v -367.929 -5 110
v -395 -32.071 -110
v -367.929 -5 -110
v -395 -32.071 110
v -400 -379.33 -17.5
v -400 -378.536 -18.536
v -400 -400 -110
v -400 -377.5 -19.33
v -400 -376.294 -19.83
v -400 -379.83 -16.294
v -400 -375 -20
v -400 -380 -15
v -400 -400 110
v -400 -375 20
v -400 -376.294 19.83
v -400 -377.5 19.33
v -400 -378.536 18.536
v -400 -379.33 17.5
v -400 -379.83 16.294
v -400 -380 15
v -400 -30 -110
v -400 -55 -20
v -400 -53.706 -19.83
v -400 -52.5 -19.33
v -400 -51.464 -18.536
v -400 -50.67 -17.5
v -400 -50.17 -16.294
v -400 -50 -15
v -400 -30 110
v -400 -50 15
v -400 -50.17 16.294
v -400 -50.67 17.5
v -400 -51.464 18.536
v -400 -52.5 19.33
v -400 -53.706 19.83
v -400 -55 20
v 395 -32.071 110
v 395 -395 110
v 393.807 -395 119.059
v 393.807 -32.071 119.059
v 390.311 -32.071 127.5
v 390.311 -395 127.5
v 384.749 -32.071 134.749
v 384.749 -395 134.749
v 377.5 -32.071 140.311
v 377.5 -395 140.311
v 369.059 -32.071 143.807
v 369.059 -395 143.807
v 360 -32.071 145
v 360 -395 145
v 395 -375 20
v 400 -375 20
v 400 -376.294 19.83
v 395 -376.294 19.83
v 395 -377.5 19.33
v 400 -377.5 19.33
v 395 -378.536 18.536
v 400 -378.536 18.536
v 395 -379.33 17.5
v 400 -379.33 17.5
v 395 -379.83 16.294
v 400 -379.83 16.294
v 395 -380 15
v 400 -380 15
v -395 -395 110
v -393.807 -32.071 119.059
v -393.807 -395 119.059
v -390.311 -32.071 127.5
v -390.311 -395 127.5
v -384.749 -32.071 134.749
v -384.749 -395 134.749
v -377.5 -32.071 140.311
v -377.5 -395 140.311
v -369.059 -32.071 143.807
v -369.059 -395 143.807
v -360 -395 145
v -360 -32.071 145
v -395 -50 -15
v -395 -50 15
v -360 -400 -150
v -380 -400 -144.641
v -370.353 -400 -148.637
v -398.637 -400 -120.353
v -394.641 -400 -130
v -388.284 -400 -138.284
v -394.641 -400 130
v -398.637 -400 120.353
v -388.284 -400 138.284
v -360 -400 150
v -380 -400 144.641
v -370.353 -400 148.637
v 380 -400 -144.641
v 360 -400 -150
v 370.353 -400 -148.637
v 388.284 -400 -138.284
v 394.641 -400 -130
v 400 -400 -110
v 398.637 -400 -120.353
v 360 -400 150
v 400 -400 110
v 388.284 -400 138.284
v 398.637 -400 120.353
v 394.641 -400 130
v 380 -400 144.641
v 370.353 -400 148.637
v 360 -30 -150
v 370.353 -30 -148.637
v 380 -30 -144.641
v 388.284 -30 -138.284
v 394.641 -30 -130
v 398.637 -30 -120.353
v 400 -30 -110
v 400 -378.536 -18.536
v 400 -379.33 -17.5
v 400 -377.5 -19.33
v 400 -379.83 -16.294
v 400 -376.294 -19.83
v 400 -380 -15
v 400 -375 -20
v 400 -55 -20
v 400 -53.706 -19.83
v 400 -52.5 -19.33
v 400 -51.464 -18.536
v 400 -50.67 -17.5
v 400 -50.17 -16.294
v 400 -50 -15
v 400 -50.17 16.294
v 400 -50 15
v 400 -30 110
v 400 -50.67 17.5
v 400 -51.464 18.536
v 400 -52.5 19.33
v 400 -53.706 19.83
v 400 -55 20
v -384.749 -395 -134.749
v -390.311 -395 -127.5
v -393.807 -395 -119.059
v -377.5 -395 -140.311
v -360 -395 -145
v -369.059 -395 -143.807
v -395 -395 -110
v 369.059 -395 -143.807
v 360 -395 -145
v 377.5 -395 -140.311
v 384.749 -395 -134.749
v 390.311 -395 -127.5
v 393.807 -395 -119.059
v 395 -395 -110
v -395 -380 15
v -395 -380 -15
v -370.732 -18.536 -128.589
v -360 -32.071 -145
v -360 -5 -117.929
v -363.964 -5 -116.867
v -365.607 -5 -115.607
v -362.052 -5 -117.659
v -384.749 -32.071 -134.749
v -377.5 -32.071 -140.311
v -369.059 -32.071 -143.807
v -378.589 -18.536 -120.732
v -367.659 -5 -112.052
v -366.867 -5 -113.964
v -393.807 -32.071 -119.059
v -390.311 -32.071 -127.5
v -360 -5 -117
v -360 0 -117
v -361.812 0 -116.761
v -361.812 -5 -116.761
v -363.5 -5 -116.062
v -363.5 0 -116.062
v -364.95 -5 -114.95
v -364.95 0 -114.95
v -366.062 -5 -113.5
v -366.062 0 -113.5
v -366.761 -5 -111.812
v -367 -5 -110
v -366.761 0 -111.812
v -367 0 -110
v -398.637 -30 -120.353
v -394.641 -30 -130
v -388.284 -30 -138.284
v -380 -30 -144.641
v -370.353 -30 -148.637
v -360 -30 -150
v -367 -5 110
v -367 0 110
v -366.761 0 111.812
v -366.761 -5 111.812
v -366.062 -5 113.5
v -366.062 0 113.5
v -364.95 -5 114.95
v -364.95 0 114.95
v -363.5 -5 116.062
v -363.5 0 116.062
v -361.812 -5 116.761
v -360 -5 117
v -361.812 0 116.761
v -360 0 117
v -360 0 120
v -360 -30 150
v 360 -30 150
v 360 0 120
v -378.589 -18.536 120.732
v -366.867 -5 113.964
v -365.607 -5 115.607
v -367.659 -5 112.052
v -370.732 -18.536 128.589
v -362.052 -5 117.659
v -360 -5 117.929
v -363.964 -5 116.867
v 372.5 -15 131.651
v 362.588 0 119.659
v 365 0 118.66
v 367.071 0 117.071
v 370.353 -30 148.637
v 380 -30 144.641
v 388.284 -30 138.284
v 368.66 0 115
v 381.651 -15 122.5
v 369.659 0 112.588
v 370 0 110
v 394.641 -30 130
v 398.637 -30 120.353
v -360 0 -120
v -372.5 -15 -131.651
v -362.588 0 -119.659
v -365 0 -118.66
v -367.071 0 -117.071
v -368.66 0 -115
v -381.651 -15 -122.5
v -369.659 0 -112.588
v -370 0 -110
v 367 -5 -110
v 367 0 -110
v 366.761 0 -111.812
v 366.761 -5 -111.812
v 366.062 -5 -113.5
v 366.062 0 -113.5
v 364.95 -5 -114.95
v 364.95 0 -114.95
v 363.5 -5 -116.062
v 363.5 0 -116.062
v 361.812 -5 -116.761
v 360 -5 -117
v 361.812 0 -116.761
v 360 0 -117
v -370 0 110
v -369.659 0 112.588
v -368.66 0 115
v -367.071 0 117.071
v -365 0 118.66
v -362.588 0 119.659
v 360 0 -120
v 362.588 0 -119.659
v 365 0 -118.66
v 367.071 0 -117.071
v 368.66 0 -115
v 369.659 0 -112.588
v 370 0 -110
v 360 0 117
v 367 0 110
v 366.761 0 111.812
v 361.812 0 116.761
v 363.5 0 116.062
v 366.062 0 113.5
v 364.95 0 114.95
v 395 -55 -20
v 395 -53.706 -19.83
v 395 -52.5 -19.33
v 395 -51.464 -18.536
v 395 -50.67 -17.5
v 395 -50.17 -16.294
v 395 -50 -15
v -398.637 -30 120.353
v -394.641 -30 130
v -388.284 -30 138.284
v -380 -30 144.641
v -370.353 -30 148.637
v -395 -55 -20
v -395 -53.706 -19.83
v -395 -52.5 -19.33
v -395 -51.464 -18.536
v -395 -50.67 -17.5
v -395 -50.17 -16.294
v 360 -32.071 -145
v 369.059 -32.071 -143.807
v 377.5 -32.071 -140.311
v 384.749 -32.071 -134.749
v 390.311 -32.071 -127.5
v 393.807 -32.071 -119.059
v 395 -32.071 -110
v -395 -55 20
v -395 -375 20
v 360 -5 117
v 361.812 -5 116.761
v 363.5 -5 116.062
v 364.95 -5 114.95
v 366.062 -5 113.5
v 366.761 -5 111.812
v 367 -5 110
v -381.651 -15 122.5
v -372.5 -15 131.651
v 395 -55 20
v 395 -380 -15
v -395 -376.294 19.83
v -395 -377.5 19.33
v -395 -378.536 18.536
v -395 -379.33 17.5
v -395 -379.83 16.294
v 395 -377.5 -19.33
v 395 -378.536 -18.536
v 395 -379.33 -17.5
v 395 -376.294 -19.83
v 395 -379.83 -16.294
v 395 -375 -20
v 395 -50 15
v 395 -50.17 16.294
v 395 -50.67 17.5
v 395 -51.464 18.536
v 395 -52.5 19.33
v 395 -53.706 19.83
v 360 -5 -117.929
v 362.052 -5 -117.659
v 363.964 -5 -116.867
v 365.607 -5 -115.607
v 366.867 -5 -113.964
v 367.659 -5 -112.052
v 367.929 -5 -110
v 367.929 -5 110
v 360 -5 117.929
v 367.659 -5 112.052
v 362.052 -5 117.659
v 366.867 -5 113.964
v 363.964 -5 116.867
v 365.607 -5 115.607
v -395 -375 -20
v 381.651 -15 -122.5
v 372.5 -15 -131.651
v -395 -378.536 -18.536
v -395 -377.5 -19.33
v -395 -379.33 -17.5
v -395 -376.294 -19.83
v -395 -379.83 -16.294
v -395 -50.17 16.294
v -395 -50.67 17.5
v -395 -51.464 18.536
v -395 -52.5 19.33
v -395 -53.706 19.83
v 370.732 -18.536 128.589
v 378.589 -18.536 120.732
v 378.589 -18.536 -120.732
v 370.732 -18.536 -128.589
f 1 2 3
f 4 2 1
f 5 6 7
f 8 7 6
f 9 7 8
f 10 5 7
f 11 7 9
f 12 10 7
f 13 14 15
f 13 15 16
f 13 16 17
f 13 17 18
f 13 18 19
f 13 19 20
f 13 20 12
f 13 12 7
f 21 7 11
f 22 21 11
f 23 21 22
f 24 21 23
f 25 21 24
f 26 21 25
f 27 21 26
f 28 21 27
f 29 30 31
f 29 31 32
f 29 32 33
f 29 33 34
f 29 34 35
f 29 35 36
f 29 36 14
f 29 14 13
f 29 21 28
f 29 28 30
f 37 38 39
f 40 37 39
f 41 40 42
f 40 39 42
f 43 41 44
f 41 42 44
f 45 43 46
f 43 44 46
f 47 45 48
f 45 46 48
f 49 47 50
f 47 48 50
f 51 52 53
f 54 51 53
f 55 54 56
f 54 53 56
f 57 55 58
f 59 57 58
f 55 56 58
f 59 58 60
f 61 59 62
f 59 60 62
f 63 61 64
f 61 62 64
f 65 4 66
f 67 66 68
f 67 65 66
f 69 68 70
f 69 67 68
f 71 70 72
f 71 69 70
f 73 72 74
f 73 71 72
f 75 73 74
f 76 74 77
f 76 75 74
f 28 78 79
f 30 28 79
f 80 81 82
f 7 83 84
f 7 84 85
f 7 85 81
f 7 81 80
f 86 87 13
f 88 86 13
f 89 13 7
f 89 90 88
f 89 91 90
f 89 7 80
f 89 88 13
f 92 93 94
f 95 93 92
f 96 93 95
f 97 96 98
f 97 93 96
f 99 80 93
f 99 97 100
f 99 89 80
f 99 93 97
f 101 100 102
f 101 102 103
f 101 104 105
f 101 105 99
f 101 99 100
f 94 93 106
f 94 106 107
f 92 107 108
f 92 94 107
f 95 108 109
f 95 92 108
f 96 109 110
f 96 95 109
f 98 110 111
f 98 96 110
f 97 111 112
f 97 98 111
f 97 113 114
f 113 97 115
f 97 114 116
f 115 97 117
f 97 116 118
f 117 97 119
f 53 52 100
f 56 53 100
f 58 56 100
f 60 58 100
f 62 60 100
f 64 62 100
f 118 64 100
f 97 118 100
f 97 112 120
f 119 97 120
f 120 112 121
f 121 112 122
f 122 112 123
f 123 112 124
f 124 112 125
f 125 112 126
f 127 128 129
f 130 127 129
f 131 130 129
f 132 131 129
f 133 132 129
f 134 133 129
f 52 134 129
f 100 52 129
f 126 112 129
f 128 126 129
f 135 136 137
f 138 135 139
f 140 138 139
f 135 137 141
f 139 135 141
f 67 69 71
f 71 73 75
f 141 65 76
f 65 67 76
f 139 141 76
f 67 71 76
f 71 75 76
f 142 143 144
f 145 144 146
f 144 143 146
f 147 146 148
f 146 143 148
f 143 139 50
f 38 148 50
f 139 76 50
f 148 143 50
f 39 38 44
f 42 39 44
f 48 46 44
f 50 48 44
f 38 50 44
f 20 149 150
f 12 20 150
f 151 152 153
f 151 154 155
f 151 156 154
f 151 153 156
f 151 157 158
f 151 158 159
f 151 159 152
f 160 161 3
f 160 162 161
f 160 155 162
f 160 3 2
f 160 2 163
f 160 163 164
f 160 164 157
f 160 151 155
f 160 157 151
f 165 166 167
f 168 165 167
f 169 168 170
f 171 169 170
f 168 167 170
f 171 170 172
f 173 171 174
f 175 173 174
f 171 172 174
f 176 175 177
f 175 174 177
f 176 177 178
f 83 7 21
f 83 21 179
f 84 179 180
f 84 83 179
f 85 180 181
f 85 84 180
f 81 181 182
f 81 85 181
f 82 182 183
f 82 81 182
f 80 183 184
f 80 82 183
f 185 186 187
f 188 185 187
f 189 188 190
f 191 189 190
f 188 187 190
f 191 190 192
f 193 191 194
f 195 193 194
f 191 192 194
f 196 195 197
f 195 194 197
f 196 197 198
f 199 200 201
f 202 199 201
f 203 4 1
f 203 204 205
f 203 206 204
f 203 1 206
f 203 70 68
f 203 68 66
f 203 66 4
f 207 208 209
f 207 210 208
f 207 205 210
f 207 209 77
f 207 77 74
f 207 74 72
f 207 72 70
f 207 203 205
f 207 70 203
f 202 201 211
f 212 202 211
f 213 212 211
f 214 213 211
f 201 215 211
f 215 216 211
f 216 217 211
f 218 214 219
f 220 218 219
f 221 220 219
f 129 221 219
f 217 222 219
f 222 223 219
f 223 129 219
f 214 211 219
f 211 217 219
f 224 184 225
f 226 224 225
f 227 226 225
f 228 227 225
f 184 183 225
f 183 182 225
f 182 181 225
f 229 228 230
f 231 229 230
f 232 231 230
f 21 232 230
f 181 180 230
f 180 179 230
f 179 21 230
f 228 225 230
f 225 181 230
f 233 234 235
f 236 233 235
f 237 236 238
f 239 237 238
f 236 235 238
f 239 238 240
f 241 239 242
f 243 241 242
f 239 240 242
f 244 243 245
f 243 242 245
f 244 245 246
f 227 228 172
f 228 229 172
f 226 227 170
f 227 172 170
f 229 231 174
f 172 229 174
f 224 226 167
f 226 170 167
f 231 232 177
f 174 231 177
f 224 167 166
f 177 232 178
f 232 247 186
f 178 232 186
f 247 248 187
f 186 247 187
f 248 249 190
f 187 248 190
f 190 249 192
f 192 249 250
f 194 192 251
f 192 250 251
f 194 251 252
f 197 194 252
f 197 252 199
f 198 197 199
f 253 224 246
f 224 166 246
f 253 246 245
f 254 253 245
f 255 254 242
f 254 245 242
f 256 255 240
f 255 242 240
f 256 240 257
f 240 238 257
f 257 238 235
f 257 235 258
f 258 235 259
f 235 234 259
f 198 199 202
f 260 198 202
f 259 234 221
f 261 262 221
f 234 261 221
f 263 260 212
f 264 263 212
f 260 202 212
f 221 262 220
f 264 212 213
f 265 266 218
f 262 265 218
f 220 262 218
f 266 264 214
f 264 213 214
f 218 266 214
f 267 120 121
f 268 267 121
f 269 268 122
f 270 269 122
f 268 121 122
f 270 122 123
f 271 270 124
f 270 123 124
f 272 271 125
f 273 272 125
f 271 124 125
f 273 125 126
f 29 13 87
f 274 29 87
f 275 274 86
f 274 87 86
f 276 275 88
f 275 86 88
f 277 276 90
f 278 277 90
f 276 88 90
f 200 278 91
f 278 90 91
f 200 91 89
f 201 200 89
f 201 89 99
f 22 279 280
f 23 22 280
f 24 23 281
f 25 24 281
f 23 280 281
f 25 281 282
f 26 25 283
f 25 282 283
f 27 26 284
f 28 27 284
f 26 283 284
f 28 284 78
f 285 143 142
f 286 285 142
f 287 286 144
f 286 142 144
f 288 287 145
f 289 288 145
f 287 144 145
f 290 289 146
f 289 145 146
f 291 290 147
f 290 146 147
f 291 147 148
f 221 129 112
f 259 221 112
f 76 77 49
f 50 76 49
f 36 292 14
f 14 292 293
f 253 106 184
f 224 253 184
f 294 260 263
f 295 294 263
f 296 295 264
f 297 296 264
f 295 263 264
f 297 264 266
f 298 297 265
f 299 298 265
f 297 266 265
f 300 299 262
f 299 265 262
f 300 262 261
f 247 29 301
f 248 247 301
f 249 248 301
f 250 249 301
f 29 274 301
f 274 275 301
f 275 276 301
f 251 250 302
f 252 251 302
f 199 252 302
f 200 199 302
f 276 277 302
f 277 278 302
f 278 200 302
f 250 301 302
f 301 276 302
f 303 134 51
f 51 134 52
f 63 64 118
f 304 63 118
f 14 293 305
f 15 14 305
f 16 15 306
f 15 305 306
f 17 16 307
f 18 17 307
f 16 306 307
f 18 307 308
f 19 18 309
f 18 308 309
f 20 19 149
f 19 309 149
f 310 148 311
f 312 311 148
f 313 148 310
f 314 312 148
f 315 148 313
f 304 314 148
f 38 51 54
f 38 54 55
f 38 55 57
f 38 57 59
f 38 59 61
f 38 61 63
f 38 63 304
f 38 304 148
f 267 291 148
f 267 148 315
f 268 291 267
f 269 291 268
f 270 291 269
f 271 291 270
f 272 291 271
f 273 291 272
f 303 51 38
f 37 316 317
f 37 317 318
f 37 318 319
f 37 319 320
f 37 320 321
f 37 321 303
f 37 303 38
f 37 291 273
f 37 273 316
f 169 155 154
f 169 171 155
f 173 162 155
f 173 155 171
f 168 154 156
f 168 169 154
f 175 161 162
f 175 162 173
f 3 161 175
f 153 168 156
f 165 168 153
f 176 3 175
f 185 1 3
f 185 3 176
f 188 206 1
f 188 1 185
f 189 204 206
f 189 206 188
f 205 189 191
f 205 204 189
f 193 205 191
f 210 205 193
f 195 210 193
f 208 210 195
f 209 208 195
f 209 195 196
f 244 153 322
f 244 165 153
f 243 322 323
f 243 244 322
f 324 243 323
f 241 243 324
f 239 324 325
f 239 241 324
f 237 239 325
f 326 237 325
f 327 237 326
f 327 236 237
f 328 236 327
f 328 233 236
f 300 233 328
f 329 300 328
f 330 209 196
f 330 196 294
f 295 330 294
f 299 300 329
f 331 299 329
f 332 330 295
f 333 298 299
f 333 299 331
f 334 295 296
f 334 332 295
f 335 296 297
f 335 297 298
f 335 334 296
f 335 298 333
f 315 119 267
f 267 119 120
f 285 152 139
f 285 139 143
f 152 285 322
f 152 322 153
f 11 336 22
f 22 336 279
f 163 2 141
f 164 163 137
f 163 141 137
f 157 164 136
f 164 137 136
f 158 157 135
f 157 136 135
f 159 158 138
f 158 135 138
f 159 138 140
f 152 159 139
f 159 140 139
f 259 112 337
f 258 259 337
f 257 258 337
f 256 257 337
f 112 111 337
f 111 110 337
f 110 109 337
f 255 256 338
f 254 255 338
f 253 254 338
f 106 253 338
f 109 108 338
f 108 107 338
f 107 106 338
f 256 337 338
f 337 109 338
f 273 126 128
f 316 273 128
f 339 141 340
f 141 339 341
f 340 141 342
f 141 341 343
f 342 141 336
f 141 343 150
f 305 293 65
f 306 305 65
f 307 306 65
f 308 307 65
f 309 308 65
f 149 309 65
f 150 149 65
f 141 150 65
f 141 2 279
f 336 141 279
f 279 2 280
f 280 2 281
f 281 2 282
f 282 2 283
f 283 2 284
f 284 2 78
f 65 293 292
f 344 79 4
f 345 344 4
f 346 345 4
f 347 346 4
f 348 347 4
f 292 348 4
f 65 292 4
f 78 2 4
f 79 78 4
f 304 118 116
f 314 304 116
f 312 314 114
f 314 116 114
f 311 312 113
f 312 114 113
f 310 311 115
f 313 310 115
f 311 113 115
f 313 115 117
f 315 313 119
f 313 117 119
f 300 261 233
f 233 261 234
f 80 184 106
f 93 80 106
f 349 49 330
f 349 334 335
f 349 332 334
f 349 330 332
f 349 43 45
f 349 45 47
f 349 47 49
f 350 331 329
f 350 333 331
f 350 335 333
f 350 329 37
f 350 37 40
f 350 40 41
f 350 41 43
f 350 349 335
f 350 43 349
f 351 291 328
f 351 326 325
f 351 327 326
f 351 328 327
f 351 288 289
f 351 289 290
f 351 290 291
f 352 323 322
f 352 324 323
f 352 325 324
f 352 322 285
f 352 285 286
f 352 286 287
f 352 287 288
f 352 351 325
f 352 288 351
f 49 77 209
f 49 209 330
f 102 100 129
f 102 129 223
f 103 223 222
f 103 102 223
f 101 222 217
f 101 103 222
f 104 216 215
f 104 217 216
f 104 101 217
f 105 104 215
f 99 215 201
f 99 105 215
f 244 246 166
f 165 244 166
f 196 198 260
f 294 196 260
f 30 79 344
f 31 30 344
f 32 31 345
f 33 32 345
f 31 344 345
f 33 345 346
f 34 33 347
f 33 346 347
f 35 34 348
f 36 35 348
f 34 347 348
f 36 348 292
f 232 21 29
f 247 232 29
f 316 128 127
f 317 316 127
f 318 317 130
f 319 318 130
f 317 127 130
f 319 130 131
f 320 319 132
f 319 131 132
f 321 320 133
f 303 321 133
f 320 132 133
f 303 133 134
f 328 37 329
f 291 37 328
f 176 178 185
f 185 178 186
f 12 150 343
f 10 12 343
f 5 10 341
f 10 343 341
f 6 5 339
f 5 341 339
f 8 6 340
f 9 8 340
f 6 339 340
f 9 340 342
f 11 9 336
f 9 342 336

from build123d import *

# Parameters (mm, degrees)
F0_W     = 800
F0_H     = 300
F1_DEPTH = 400
F2_R     = 40
F3_SIZE  = 30
F5_DEPTH = 5
F6_T     = 5
F8_DEPTH = 800.001


# Not quite as in the source:
# - a shell that OpenCascade refuses in one call is made with other operations: the cavity is built on its own and cut out


with BuildPart() as f1:
    # F0 (on Front) → F1 (new body)
    with BuildSketch(Plane.XZ):
        Rectangle(F0_W, F0_H)
    extrude(amount=F1_DEPTH)

    # F2
    f2_edges = [f1.edges().sort_by_distance(p)[0] for p in [
        (400, -200, 150),
        (-400, -200, 150),
        (400, -200, -150),
        (-400, -200, -150),
    ]]
    fillet(f2_edges, radius=F2_R)

    # F3
    f3_edges = [f1.edges().sort_by_distance(p)[0] for p in [
        (0, 0, 150),
        (0, 0, -150),
        (-388.284271, 0, -138.284271),
        (388.284271, 0, -138.284271),
        (-400, 0, 0),
        (400, 0, 0),
        (-388.284271, 0, 138.284271),
        (388.284271, 0, 138.284271),
    ]]
    chamfer(f3_edges, length=F3_SIZE)

    # F4 (on face) → F5 (cut)
    with BuildSketch(Plane(origin=(0, 0, 0), x_dir=(-1, 0, 0), z_dir=(0, 1, 0))):
        with BuildLine():
            Line((366.9999986887, -110), (366.9999986887, 110))
            ThreePointArc((366.9999986887, 110), (364.9497465411, 114.9497465411), (360, 116.9999986887))
            Line((360, 116.9999986887), (-360, 116.9999986887))
            ThreePointArc((-360, 116.9999986887), (-364.9497465411, 114.9497465411), (-366.9999986887, 110))
            Line((-366.9999986887, 110), (-366.9999986887, -110))
            ThreePointArc((-366.9999986887, -110), (-364.9497465411, -114.9497465411), (-360, -116.9999986887))
            Line((-360, -116.9999986887), (360, -116.9999986887))
            ThreePointArc((360, -116.9999986887), (364.9497465411, -114.9497465411), (366.9999986887, -110))
        make_face()
    extrude(amount=-F5_DEPTH, mode=Mode.SUBTRACT)

    # F6: shell of thickness 5, made by hand


with BuildPart() as f6_core1:
    # F6_t2: copy of F1
    add(f1.part)

    # the walls: a layer under each face that stays
    f6_faces = [f6_core1.faces().sort_by_distance(p)[0] for p in [
        (0, -215, -150),
        (-388.2842712475, -215, -138.2842712475),
        (0, -15, -135),
        (0, -400, 0),
        (388.2842712475, -215, -138.2842712475),
        (-377.6776695297, -15, -127.6776695297),
        (-400, -215, 0),
        (254.375, 0, -117.037037037),
        (377.6776695297, -15, -127.6776695297),
        (400, -215, 0),
        (-388.2842712475, -215, 138.2842712475),
        (388.2842712475, -215, 138.2842712475),
        (0, -215, 150),
        (-385, -15, 0),
        (0, -15, 135),
        (377.6776695297, -15, 127.6776695297),
        (-377.6776695297, -15, 127.6776695297),
        (385, -15, 0),
        (364.9497465411, -2.5, -114.9497465411),
        (366.9999986887, -2.5, 0),
        (364.9497465411, -2.5, 114.9497465411),
        (0, -2.5, 116.9999986887),
        (-364.9497465411, -2.5, 114.9497465411),
        (-366.9999986887, -2.5, 0),
        (-364.9497465411, -2.5, -114.9497465411),
        (0, -2.5, -116.9999986887),
    ]]
    thicken(f6_faces, amount=-F6_T, mode=Mode.SUBTRACT)


with BuildPart() as f1_1:
    add(f1.part)

    # what is left inside the walls is the cavity
    f6_cavity = [f6_core1.part.solids().sort_by_distance(p)[0] for p in [
        (0, -274.023689, -144.95),
    ]]
    add(f6_cavity, mode=Mode.SUBTRACT)

    # F7 (on face) → F8 (cut, through all)
    with BuildSketch(Plane.YZ.offset(400)):
        with BuildLine():
            Line((-375, -20), (-55, -20))
            ThreePointArc((-55, -20), (-51.4644660941, -18.5355339059), (-50, -15))
            Line((-50, -15), (-50, 15))
            ThreePointArc((-50, 15), (-51.4644660941, 18.5355339059), (-55, 20))
            Line((-55, 20), (-375, 20))
            ThreePointArc((-375, 20), (-378.5355339059, 18.5355339059), (-380, 15))
            Line((-380, 15), (-380, -15))
            ThreePointArc((-380, -15), (-378.5355339059, -18.5355339059), (-375, -20))
        make_face()
    extrude(amount=-F8_DEPTH, mode=Mode.SUBTRACT)


solid = f1_1.part
